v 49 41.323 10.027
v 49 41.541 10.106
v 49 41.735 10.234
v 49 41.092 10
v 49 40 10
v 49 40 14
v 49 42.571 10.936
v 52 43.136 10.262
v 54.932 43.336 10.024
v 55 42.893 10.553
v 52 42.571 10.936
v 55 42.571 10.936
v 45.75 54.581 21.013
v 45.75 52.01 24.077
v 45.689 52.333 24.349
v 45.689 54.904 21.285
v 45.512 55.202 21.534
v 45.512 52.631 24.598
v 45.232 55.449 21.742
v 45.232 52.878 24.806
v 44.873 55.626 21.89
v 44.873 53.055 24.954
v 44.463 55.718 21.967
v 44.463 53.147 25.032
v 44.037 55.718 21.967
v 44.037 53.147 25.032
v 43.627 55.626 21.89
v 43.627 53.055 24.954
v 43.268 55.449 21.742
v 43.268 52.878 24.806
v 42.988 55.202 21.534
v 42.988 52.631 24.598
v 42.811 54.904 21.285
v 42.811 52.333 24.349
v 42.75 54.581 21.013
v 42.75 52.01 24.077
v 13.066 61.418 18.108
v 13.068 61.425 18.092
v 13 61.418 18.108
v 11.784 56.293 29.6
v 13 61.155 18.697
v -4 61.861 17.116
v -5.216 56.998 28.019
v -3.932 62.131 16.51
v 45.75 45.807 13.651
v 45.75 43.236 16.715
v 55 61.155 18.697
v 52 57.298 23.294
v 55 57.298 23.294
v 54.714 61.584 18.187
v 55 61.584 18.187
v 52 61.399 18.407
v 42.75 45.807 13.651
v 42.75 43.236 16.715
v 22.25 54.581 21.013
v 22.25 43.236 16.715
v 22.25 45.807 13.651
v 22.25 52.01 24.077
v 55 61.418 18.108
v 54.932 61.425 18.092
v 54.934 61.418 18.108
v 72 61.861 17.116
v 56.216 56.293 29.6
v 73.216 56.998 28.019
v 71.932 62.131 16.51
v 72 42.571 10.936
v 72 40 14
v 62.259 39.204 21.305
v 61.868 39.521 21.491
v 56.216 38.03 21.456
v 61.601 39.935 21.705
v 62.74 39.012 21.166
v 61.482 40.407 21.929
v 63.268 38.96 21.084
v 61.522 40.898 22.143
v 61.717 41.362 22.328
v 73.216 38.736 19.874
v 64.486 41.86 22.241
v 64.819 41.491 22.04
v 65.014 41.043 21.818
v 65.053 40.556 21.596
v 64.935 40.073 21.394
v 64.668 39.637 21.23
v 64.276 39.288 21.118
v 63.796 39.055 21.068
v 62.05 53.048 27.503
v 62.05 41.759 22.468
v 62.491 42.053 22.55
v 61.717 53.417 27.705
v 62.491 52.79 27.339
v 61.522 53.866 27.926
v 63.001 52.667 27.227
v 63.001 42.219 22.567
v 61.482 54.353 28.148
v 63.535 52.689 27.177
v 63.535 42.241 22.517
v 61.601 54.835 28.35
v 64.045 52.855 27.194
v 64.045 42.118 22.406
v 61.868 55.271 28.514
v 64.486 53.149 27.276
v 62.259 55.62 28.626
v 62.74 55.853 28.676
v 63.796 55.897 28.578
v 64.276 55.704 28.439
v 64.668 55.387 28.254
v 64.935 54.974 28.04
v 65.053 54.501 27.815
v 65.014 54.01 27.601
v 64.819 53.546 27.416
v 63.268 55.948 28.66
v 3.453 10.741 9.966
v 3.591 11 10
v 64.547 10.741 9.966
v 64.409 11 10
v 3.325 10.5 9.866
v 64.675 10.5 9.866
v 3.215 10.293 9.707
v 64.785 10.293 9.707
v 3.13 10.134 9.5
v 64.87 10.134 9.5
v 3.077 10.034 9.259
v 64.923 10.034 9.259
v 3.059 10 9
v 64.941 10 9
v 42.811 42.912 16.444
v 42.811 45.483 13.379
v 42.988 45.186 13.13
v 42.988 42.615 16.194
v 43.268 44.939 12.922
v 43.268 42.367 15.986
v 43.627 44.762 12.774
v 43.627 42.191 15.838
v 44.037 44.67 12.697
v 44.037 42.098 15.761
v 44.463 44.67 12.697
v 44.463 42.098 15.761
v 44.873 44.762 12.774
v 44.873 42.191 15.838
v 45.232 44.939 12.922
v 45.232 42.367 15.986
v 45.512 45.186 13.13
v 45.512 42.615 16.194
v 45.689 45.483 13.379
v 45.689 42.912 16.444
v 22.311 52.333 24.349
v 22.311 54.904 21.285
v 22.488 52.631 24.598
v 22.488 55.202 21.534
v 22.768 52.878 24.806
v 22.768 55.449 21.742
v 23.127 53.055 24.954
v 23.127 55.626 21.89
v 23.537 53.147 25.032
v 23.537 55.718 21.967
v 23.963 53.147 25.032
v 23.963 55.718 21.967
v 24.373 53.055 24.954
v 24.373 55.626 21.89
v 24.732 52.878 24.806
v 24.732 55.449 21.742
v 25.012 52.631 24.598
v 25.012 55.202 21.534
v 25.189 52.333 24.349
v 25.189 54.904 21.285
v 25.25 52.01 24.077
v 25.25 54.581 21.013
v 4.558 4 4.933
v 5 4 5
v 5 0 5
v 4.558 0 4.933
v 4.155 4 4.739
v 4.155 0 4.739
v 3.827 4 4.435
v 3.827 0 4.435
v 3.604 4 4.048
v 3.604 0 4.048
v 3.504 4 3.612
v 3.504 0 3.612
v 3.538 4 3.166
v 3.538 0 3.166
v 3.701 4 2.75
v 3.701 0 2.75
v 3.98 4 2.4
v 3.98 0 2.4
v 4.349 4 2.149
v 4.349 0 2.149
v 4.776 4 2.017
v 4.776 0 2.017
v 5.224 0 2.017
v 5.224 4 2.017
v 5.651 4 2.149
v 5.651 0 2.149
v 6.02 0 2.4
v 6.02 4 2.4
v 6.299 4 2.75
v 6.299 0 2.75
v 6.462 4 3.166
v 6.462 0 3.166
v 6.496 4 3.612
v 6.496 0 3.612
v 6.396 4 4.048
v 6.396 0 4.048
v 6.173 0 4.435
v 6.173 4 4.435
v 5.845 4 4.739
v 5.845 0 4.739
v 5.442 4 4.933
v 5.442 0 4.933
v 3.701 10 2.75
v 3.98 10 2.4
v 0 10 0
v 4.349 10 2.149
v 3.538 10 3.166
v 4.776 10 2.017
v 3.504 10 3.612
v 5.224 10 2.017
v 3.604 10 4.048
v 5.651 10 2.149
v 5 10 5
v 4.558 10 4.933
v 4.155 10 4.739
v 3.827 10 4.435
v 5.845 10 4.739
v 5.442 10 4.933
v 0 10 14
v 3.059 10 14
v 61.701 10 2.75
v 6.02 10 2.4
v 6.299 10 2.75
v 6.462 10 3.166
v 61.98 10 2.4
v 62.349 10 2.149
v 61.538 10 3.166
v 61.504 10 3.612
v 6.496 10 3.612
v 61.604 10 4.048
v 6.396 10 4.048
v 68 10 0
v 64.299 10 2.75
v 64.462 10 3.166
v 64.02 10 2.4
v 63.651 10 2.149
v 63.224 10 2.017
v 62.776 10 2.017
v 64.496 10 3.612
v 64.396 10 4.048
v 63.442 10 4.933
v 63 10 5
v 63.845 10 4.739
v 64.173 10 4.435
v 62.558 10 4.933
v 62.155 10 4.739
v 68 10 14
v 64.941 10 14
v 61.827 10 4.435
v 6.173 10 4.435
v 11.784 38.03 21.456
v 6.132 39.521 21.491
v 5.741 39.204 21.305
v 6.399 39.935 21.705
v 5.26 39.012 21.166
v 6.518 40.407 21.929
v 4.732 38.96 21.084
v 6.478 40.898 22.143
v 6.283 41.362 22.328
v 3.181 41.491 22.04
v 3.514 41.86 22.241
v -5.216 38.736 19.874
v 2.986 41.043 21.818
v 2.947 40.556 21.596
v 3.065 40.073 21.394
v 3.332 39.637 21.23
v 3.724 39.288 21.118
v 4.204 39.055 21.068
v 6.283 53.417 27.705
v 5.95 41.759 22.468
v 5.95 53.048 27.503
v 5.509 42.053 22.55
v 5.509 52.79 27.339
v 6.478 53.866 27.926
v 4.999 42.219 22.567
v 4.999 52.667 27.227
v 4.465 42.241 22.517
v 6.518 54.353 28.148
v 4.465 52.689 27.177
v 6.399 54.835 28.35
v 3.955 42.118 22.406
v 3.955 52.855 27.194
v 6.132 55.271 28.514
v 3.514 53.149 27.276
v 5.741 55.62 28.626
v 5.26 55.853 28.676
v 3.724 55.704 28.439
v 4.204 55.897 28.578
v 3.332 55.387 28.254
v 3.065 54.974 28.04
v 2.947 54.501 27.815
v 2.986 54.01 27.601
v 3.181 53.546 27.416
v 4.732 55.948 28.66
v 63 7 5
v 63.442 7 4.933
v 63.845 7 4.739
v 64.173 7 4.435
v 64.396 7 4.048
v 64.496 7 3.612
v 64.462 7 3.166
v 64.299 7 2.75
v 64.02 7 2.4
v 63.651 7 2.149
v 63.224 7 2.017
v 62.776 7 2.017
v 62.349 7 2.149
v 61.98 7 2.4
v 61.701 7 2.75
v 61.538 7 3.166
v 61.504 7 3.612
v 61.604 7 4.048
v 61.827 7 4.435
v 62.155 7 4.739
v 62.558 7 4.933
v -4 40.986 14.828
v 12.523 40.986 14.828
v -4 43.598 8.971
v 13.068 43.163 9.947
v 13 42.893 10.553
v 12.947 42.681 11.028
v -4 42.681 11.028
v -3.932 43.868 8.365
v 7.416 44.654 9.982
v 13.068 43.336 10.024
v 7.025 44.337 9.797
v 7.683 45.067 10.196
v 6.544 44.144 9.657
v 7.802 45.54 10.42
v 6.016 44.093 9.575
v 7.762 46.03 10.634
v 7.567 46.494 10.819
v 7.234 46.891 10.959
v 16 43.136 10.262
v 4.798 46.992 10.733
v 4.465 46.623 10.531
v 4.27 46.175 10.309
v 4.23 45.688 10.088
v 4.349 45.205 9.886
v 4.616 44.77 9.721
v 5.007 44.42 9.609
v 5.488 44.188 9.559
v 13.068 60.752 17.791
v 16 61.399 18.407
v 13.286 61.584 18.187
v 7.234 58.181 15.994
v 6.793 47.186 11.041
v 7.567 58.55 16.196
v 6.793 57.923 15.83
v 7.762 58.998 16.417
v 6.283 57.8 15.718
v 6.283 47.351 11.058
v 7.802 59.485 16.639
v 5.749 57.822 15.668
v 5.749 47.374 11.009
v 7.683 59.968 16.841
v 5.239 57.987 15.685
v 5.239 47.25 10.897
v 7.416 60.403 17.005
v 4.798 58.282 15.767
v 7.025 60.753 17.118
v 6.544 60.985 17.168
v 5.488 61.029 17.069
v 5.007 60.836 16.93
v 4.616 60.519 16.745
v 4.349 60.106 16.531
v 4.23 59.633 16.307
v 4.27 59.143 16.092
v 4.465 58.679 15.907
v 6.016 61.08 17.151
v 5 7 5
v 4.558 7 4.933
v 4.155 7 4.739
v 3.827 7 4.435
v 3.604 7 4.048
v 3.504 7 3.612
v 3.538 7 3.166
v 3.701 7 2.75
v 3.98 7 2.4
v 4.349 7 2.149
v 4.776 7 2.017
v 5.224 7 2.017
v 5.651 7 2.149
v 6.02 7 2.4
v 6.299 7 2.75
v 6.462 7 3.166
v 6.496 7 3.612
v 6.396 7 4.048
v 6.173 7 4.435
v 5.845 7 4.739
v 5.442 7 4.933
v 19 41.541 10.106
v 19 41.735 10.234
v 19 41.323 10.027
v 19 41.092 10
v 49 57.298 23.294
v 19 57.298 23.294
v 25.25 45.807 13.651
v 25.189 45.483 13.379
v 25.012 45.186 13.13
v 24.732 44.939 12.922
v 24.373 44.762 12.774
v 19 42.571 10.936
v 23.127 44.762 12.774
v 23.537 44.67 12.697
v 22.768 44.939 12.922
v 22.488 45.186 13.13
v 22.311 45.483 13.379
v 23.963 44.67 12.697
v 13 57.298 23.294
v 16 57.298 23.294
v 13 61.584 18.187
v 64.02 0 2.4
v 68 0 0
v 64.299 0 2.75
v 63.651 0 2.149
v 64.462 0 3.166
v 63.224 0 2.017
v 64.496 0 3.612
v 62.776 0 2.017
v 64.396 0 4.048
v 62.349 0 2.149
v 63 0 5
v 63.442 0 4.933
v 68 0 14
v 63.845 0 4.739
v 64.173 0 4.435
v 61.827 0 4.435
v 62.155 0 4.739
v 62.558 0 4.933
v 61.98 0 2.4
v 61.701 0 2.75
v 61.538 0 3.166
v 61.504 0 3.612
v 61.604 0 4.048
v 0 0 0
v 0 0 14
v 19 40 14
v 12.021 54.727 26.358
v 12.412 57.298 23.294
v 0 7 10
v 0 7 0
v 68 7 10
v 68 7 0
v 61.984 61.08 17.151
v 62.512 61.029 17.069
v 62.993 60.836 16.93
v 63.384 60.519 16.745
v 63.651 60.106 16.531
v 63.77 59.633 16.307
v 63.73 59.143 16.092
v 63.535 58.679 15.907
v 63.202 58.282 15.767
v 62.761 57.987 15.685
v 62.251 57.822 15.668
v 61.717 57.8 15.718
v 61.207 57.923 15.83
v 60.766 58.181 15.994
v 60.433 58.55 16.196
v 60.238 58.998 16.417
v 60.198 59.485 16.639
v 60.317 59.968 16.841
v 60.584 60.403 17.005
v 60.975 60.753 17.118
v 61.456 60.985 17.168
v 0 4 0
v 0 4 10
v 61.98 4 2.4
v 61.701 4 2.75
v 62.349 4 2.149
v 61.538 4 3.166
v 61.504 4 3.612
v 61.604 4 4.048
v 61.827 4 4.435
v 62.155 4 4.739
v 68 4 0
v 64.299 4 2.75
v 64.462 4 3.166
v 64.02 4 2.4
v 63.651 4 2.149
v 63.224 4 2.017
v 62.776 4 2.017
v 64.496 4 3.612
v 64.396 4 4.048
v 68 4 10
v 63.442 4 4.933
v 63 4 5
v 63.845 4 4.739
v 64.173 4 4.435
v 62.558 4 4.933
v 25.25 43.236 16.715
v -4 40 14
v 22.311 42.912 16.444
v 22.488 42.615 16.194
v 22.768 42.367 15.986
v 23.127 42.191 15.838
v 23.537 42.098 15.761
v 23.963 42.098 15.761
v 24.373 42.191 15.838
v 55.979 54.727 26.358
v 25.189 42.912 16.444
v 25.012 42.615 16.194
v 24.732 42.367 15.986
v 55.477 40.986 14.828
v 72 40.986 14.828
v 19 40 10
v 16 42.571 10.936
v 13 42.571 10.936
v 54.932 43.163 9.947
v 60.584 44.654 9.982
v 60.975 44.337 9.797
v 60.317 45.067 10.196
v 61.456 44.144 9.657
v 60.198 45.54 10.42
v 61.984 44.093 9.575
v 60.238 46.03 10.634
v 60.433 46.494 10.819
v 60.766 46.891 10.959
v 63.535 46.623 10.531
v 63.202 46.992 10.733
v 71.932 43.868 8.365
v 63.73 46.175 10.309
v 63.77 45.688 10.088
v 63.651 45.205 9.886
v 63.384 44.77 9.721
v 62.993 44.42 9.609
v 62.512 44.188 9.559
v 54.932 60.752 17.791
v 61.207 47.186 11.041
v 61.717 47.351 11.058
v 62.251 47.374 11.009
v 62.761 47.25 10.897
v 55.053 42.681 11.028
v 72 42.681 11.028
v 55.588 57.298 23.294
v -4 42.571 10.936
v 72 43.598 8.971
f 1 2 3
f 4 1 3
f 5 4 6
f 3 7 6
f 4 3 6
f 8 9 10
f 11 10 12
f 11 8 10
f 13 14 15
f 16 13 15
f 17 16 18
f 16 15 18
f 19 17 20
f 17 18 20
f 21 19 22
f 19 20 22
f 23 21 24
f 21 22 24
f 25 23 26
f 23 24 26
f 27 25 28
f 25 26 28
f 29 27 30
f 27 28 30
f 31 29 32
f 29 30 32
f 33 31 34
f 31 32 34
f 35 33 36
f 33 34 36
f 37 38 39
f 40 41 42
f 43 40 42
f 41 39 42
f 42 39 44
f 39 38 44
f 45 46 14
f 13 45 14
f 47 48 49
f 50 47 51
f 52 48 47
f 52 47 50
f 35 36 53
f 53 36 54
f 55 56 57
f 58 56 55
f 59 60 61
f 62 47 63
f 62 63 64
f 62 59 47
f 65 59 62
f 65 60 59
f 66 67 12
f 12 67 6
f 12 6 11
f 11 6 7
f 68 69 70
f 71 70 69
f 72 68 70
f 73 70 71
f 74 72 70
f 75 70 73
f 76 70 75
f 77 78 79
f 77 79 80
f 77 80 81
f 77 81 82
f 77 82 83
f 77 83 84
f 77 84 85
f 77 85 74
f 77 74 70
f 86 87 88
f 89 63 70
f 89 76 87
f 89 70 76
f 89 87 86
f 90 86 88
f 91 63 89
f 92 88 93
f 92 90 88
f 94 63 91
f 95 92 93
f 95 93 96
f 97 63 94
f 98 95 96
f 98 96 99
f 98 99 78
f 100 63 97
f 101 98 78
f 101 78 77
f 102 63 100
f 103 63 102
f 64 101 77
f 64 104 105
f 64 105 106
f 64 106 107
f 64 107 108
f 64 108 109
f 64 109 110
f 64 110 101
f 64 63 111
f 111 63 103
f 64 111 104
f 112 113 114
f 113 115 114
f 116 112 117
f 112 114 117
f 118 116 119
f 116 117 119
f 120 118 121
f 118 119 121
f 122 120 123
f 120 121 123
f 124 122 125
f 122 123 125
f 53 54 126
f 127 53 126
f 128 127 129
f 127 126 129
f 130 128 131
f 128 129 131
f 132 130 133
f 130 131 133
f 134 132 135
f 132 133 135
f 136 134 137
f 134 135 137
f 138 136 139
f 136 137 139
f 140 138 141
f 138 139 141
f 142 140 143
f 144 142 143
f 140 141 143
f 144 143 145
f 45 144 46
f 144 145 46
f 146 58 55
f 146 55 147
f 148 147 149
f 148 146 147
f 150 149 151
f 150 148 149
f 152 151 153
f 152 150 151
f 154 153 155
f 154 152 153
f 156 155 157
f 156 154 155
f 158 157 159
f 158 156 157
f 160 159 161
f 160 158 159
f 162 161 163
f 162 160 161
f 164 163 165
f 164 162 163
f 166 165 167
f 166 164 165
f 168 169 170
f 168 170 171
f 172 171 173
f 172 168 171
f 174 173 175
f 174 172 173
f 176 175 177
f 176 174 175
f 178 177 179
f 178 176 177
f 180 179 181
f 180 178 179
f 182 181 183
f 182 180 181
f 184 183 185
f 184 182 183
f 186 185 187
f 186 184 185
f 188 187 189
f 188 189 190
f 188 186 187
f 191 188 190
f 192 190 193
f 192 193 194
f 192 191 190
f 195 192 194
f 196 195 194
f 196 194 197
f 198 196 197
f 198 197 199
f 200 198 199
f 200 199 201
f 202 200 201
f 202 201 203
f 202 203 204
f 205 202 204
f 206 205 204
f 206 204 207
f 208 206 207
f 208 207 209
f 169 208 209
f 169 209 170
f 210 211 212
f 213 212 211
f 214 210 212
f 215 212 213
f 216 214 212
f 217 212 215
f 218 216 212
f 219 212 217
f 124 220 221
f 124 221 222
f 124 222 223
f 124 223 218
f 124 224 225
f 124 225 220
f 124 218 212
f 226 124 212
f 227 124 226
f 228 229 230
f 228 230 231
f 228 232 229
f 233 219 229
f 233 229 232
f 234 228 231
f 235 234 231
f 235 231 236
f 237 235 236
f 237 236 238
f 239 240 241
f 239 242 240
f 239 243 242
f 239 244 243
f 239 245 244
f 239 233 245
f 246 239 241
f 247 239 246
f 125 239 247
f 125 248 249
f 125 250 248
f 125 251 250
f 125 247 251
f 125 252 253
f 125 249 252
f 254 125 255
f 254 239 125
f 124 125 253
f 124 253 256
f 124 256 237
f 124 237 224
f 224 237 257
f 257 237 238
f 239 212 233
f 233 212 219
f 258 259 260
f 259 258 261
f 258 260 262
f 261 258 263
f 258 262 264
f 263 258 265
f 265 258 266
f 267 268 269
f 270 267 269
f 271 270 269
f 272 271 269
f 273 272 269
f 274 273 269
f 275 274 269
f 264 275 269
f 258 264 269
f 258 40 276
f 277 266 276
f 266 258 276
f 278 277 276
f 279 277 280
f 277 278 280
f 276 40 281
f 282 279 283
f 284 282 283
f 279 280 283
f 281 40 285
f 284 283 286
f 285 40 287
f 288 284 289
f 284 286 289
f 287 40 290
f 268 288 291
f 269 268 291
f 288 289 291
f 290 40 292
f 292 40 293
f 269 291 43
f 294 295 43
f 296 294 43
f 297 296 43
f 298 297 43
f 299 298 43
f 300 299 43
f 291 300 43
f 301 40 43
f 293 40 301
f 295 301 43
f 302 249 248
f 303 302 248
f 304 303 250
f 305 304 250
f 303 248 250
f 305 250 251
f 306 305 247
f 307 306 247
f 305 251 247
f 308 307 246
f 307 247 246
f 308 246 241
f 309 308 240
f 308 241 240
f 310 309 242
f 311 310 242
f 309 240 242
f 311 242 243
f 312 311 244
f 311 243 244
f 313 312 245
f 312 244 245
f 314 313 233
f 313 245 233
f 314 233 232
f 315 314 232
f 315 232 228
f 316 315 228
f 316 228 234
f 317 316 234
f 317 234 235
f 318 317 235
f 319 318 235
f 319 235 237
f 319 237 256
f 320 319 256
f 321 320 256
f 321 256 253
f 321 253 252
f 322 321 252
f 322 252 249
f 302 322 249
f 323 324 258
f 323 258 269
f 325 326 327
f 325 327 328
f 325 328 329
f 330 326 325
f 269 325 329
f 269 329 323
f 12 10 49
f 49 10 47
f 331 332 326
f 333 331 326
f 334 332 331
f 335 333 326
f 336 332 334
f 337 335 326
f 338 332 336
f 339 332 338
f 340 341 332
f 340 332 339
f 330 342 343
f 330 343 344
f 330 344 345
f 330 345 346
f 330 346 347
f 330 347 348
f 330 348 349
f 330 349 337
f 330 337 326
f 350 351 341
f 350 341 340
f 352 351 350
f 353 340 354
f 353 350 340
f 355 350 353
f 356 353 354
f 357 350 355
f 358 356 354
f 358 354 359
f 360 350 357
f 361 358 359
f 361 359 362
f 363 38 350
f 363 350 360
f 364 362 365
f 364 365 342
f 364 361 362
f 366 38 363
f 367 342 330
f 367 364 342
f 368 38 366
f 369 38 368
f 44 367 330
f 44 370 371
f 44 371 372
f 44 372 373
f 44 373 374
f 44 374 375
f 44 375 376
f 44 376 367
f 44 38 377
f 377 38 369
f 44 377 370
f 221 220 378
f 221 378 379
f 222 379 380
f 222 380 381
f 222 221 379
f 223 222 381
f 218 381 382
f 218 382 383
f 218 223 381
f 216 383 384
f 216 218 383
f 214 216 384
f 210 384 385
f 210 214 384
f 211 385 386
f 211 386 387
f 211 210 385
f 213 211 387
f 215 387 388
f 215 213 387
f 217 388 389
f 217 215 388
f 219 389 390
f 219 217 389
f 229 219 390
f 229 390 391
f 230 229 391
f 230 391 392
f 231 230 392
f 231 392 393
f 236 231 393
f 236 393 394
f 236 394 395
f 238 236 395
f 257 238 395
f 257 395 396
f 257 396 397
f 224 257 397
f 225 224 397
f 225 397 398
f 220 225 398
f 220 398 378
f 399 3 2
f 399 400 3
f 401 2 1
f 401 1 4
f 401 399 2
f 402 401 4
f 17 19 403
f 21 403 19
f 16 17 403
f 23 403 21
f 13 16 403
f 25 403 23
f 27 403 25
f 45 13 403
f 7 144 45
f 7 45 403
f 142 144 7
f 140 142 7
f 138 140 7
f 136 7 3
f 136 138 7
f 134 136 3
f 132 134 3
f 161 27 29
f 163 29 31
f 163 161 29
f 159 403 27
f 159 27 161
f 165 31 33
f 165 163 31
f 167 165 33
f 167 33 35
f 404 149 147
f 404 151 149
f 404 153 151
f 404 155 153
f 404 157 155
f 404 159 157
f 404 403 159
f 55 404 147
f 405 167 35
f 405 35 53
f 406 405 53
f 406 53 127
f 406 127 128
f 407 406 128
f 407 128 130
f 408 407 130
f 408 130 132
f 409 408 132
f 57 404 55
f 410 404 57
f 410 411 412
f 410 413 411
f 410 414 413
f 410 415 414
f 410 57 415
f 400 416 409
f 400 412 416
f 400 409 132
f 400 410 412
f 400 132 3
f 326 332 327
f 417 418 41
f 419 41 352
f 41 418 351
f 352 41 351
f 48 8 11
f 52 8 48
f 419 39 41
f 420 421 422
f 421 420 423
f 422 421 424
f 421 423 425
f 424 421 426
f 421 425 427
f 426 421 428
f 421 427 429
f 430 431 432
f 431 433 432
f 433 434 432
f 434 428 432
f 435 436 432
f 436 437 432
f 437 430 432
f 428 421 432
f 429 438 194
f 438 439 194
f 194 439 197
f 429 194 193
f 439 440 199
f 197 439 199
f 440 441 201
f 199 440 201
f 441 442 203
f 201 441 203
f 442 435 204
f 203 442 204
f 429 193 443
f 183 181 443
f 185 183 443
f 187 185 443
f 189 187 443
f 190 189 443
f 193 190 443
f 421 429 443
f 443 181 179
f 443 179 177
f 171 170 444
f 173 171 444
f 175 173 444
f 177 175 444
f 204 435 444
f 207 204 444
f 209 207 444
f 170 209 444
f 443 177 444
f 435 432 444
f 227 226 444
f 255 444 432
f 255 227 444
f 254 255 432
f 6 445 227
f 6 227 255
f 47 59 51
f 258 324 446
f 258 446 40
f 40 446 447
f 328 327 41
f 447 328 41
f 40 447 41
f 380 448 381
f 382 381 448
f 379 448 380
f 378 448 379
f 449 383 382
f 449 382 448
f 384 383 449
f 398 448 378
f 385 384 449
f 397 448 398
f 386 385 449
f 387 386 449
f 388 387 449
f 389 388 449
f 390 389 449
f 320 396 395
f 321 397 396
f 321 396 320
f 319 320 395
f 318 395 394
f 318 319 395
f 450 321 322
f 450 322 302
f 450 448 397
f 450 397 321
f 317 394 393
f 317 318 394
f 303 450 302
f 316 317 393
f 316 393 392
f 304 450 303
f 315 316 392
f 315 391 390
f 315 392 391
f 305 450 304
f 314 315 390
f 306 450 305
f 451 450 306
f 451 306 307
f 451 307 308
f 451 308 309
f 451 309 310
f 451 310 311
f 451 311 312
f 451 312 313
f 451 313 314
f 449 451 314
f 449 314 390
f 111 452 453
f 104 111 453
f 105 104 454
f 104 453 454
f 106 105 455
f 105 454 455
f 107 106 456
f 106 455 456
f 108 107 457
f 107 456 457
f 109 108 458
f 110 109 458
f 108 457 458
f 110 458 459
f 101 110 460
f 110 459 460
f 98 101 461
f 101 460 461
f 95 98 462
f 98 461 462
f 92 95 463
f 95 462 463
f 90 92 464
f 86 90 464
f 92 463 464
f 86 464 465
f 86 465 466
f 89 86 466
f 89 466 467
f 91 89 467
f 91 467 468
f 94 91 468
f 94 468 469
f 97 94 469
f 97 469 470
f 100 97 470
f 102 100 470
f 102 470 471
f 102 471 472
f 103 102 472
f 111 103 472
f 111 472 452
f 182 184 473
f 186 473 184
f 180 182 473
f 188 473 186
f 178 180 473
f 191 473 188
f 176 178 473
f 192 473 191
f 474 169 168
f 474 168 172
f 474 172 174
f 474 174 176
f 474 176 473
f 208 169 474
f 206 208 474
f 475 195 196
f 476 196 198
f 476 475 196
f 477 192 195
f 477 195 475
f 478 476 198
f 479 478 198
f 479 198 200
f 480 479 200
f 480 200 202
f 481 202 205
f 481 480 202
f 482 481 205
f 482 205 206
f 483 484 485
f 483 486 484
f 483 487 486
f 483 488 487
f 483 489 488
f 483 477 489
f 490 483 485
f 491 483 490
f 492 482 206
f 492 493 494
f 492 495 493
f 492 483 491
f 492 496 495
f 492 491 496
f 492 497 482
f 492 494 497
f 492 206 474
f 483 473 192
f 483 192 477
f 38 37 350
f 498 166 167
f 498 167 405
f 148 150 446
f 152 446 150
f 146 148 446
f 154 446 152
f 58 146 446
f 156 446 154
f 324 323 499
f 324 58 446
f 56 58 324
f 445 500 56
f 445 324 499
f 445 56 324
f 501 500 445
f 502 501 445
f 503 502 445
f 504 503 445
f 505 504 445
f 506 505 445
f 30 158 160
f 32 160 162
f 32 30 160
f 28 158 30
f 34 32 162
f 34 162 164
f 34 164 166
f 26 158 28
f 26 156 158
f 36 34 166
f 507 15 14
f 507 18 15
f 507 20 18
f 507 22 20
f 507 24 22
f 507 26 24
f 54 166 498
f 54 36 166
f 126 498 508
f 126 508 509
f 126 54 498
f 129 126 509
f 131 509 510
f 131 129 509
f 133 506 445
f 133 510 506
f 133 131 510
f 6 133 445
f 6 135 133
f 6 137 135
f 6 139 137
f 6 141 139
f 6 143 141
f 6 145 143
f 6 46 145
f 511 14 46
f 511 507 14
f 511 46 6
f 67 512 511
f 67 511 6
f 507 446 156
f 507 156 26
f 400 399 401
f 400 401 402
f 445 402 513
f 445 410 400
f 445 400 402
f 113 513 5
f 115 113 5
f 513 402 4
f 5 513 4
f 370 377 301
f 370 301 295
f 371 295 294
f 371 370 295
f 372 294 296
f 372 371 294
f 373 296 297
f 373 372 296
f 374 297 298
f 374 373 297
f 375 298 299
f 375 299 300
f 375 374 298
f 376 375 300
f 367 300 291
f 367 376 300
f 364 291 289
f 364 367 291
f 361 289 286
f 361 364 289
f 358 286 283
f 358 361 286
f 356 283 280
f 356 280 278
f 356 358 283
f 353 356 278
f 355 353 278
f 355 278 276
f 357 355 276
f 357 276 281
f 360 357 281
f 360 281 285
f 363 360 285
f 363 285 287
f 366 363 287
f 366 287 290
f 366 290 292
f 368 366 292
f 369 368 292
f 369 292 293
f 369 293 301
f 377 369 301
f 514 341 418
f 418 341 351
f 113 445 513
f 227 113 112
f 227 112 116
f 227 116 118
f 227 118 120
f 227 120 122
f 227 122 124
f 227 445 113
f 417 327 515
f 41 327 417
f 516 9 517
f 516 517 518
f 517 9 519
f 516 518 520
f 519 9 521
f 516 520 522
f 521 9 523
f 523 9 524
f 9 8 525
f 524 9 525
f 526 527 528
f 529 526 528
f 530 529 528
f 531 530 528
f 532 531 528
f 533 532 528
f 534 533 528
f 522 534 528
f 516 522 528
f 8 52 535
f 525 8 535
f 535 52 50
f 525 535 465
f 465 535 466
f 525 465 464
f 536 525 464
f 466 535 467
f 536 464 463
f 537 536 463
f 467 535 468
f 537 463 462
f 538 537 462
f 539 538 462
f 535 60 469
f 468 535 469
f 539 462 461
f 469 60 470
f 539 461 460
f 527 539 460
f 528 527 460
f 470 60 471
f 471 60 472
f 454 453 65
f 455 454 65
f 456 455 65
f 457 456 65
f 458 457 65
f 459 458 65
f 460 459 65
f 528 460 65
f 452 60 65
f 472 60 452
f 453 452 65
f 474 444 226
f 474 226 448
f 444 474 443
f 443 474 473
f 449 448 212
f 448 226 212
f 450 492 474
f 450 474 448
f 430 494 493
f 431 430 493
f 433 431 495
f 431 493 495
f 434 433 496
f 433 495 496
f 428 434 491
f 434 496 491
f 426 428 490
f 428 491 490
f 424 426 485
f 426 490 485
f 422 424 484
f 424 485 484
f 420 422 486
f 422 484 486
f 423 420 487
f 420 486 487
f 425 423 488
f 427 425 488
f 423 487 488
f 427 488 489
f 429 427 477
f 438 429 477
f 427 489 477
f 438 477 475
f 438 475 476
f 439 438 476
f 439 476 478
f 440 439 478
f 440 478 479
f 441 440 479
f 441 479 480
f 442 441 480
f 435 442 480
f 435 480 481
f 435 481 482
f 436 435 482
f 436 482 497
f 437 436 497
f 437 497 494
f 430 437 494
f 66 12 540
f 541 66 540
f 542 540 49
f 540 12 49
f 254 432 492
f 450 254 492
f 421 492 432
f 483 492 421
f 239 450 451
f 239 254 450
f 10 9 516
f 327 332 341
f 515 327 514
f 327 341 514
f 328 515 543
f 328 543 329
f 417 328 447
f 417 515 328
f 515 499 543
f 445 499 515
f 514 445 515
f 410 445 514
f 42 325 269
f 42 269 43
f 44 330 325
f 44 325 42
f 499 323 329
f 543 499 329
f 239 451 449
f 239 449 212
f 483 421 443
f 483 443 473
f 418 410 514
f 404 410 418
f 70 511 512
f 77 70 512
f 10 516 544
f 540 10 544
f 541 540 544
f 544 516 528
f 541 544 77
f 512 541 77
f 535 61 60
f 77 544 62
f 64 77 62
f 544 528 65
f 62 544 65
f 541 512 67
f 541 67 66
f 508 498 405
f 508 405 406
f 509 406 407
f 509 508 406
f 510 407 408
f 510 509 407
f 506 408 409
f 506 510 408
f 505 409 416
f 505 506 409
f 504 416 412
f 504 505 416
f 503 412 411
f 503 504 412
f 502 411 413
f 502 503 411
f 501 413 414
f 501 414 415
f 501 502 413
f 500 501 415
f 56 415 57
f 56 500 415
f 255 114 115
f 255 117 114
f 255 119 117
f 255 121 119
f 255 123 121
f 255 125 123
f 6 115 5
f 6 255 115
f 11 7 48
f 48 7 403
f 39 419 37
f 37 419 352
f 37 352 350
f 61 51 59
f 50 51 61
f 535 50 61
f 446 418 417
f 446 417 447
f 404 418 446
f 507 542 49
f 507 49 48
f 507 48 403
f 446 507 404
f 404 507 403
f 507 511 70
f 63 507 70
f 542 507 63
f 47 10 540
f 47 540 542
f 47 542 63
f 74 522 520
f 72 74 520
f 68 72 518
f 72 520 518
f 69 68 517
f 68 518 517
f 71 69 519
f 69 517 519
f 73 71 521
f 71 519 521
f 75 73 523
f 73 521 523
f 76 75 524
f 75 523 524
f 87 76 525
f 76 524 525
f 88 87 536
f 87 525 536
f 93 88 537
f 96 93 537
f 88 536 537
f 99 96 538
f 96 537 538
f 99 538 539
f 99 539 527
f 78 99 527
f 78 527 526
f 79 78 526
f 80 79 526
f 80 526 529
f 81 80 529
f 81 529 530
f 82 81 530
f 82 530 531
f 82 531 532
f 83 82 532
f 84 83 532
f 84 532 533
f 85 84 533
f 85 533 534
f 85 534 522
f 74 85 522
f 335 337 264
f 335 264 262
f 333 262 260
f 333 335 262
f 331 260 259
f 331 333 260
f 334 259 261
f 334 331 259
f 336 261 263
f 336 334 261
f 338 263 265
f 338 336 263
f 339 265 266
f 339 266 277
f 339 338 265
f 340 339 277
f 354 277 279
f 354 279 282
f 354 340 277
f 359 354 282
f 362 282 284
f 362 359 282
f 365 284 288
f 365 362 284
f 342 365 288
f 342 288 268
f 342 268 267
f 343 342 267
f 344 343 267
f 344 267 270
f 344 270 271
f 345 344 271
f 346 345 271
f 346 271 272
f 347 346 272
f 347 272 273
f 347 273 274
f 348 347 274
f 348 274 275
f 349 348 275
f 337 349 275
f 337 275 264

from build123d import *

# Parameters (mm, degrees)
EXTRUDE_1_DEPTH     = 68
SKETCH_2_R          = 1.5
CUT_EXTRUDE_1_DEPTH = 60
SKETCH_3_W          = 30
SKETCH_3_H          = 4
EXTRUDE_2_DEPTH     = 40
EXTRUDE_3_DEPTH     = 30
CUT_EXTRUDE_2_DEPTH = 4
EXTRUDE_4_DEPTH     = 23
EXTRUDE_START       = -53
EXTRUDE_5_DEPTH     = 23
EXTRUDE_6_DEPTH     = 3
EXTRUDE_7_DEPTH     = 0.66666
SKETCH_17_W         = 17.087989765
SKETCH_17_H         = 19.996406133
EXTRUDE_9_DEPTH     = 12
SKETCH_19_R         = 1.8
CUT_EXTRUDE_3_DEPTH = 20
SKETCH_20_W         = 61.603006609
SKETCH_20_H         = 84.586869481
CUT_EXTRUDE_4_DEPTH = 65
SKETCH_21_W         = 7.494214953
SKETCH_21_H         = 26.873102225
CUT_EXTRUDE_5_DEPTH = 2
SKETCH_22_W         = 9.970658679
SKETCH_22_H         = 25.794738871
CUT_EXTRUDE_6_DEPTH = 2
EXTRUDE_10_DEPTH    = 4
FILLET_1_R          = 1
FILLET_2_R          = 1


with BuildPart() as part:
    # 草图1 → 凸台-拉伸1 (new body)
    with BuildSketch(Plane(origin=(0, 0, 0), x_dir=(0, 0, -1), z_dir=(1, 0, 0))):
        Polygon((0, 0), (0, 4), (-10, 4), (-10, 7), (0, 7), (0, 10), (-14, 10), (-14, 0), align=None)
    extrude(amount=EXTRUDE_1_DEPTH)

    # 草图2 → 切除-拉伸1 (cut)
    with BuildSketch(Plane(origin=(0, 10, 0), x_dir=(1, 0, 0), z_dir=(0, 1, 0))):
        with Locations(Location((5, -3.5, 0), (0, 0, 270))):
            Circle(SKETCH_2_R)
        with Locations(Location((63, -3.5, 0), (0, 0, 270))):
            Circle(SKETCH_2_R)
    extrude(amount=-CUT_EXTRUDE_1_DEPTH, mode=Mode.SUBTRACT)

    # 草图3 → 凸台-拉伸2 (add)
    with BuildSketch(Plane.XZ):
        with Locations((34, 12)):
            Rectangle(SKETCH_3_W, SKETCH_3_H)
    extrude(amount=-EXTRUDE_2_DEPTH)

    # 草图4 → 凸台-拉伸3 (add)
    with BuildSketch(Plane(origin=(49, 0, 0), x_dir=(0, 0, -1), z_dir=(1, 0, 0))):
        Polygon((-14, 40), (-26.357684131, 54.727314459), (-23.293506358, 57.298464898), (-10, 41.455880937), (-10, 40), align=None)
    extrude(amount=-EXTRUDE_3_DEPTH)

    # 草图5 → 切除-拉伸2 (cut)
    with BuildSketch(Plane(origin=(0, 9.633382176, -11.480617817), x_dir=(1, 0, 0), z_dir=(0, -0.6427876096865429, 0.7660444431189751))):
        with BuildLine():
            Line((25.25, 55.318123989), (25.25, 43.864814933))
            ThreePointArc((25.25, 43.864814933), (23.75, 42.364814933), (22.25, 43.864814933))
            Line((22.25, 43.864814933), (22.25, 55.318123989))
            ThreePointArc((22.25, 55.318123989), (23.75, 56.818123989), (25.25, 55.318123989))
        make_face()
        with BuildLine():
            Line((42.75, 55.318123989), (42.75, 43.864814933))
            ThreePointArc((42.75, 43.864814933), (44.25, 42.364814933), (45.75, 43.864814933))
            Line((45.75, 43.864814933), (45.75, 55.318123989))
            ThreePointArc((45.75, 55.318123989), (44.25, 56.818123989), (42.75, 55.318123989))
        make_face()
    extrude(amount=-CUT_EXTRUDE_2_DEPTH, mode=Mode.SUBTRACT)

    # 草图6 → 凸台-拉伸4 (add)
    with BuildSketch(Plane.ZY.offset(-19)):
        Polygon((23.293506358, 57.298464898), (26.357684131, 54.727314459), (14, 40), (10.935822228, 42.571150439), align=None)
    extrude(amount=EXTRUDE_4_DEPTH)

    # 草图7 → 凸台-拉伸5 (add)
    with BuildSketch(Plane.ZY.offset(4).offset(EXTRUDE_START)):
        Polygon((23.293506358, 57.298464898), (26.357684131, 54.727314459), (14, 40), (10.935822228, 42.571150439), align=None)
    extrude(amount=-EXTRUDE_5_DEPTH)

    # 草图10 → 凸台-拉伸6 (add)
    with BuildSketch(Plane(origin=(52, 0, 0), x_dir=(0, 0.7660444431189749, 0.6427876096865431), z_dir=(-1, 0, 0))):
        Polygon((39.64080426, 18.986882184), (58.865947907, 18.986882184), (58.865947907, 25.653542184), (39.64080426, 20.653542184), align=None)
    extrude(amount=-EXTRUDE_6_DEPTH)

    # 草图15 → 凸台-拉伸7 (add)
    with BuildSketch(Plane(origin=(-0.224740323, 0.898508111, -2.01476807), x_dir=(0.9948507831271028, 0.04127952147527669, -0.09256306184522162), z_dir=(0.10135047760810084, -0.4051975406133526, 0.9085939873064868))):
        Polygon((55.510576319, 63.468125115), (55.510576319, 62.353864223), (55.510576319, 43.471718982), (72.598566084, 43.471718982), (72.598566084, 62.353864223), (72.598566084, 63.468125115), align=None)
    extrude(amount=-EXTRUDE_7_DEPTH)

    # 草图17 → 凸台-拉伸9 (add)
    with BuildSketch(Plane(origin=(-0.224740323, 0.898508111, -2.01476807), x_dir=(0.994850783127103, 0.04127952147527699, -0.09256306184522194), z_dir=(0.10135047760810126, -0.40519754061335256, 0.9085939873064869))):
        with Locations((64.054571201, 53.469922049)):
            Rectangle(SKETCH_17_W, SKETCH_17_H)
    extrude(amount=EXTRUDE_9_DEPTH)

    # 草图19 → 切除-拉伸3 (cut)
    with BuildSketch(Plane(origin=(-0.292306632, 1.168637103, -2.620491338), x_dir=(-0.9948507831271028, -0.04127952147527692, 0.09256306184522202), z_dir=(-0.10135047760810131, 0.40519754061335245, -0.908593987306487))):
        with Locations(Location((-62.598566084, 60.969922048, 0), (0, 0, 90))):
            Circle(SKETCH_19_R)
        with Locations(Location((-62.598566084, 45.969922048, 0), (0, 0, 270))):
            Circle(SKETCH_19_R)
    extrude(amount=-CUT_EXTRUDE_3_DEPTH, mode=Mode.SUBTRACT)

    # 草图20 → 切除-拉伸4 (cut)
    with BuildSketch(Plane.ZY.offset(-34)):
        with Locations((16.944749698, 32.191708304)):
            Rectangle(SKETCH_20_W, SKETCH_20_H)
    extrude(amount=CUT_EXTRUDE_4_DEPTH, mode=Mode.SUBTRACT)

    # 镜向7: part across plane


with BuildPart() as part_1:
    add(part.part)
    add(part.part.mirror(Plane.ZY.offset(-34)))

    # 草图21 → 切除-拉伸5 (cut)
    with BuildSketch(Plane(origin=(-0.292306632, 1.168637103, -2.620491338), x_dir=(-0.9948507831271028, -0.04127952147527692, 0.09256306184522202), z_dir=(-0.10135047760810131, 0.40519754061335245, -0.908593987306487))):
        with Locations((-54.514442647, 53.802326892)):
            Rectangle(SKETCH_21_W, SKETCH_21_H)
    extrude(amount=CUT_EXTRUDE_5_DEPTH, mode=Mode.SUBTRACT)

    # 草图22 → 切除-拉伸6 (cut)
    with BuildSketch(Plane(origin=(0.990797146, 3.961190673, -8.882368888), x_dir=(-0.9948507831271028, 0.04127952147527693, -0.09256306184522203), z_dir=(0.10135047760810131, 0.40519754061335256, -0.9085939873064868))):
        with Locations((-12.026553315, 54.032339334)):
            Rectangle(SKETCH_22_W, SKETCH_22_H)
    extrude(amount=CUT_EXTRUDE_6_DEPTH, mode=Mode.SUBTRACT)

    # 草图24 → 凸台-拉伸10 (add)
    with BuildSketch(Plane.XY.offset(14)):
        Polygon((19, 40), (3.059166743, 10), (8.395226669, 10), (19, 10), (19, 29.957752195), align=None)
        Polygon((49, 29.957752195), (49, 10), (59.604773331, 10), (64.940833257, 10), (49, 40), align=None)
    extrude(amount=-EXTRUDE_10_DEPTH)

    # 圆角1
    fillet_1_edges = [part_1.edges().sort_by_distance(p)[0] for p in [
        (34, 10, 10),
    ]]
    fillet(fillet_1_edges, radius=FILLET_1_R)

    # 圆角2
    fillet_2_edges = [part_1.edges().sort_by_distance(p)[0] for p in [
        (34, 41.455880937, 10),
    ]]
    fillet(fillet_2_edges, radius=FILLET_2_R)


solid = part_1.part
